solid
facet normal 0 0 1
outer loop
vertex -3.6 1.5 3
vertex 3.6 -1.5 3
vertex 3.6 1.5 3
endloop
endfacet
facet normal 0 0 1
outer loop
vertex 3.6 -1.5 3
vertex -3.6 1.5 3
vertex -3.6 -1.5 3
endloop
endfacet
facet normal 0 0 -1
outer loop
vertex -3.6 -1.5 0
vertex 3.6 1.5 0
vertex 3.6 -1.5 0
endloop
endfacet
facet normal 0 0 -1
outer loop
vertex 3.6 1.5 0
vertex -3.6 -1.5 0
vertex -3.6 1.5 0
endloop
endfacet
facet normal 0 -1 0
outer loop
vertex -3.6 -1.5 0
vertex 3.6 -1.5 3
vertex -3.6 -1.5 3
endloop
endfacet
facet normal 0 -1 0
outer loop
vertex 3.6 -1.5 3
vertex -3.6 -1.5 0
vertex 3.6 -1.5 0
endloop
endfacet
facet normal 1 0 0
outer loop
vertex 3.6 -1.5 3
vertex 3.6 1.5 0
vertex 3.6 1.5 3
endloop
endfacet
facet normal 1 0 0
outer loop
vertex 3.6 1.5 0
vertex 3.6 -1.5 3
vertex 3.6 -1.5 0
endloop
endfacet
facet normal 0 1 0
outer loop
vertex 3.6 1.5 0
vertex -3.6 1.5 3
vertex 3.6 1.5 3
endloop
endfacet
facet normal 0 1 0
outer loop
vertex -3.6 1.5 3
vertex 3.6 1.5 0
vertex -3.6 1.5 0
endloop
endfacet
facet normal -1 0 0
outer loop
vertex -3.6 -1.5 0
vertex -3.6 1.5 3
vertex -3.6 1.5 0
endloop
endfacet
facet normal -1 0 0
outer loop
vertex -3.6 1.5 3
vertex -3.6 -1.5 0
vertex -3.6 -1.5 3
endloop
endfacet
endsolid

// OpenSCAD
// === Parámetros del nuevo bloque abrazadera ===
largo_abrazadera = 7.2;
ancho_abrazadera = 3.0;
espesor_abrazadera = 3.0;

$fn = 100;

// === Módulo base abrazadera rectangular ===
module abrazadera_rectangular() {
    translate([-largo_abrazadera/2, -ancho_abrazadera/2, 0])
        cube([largo_abrazadera, ancho_abrazadera, espesor_abrazadera]);
}

// === Llamada al módulo
abrazadera_rectangular();
